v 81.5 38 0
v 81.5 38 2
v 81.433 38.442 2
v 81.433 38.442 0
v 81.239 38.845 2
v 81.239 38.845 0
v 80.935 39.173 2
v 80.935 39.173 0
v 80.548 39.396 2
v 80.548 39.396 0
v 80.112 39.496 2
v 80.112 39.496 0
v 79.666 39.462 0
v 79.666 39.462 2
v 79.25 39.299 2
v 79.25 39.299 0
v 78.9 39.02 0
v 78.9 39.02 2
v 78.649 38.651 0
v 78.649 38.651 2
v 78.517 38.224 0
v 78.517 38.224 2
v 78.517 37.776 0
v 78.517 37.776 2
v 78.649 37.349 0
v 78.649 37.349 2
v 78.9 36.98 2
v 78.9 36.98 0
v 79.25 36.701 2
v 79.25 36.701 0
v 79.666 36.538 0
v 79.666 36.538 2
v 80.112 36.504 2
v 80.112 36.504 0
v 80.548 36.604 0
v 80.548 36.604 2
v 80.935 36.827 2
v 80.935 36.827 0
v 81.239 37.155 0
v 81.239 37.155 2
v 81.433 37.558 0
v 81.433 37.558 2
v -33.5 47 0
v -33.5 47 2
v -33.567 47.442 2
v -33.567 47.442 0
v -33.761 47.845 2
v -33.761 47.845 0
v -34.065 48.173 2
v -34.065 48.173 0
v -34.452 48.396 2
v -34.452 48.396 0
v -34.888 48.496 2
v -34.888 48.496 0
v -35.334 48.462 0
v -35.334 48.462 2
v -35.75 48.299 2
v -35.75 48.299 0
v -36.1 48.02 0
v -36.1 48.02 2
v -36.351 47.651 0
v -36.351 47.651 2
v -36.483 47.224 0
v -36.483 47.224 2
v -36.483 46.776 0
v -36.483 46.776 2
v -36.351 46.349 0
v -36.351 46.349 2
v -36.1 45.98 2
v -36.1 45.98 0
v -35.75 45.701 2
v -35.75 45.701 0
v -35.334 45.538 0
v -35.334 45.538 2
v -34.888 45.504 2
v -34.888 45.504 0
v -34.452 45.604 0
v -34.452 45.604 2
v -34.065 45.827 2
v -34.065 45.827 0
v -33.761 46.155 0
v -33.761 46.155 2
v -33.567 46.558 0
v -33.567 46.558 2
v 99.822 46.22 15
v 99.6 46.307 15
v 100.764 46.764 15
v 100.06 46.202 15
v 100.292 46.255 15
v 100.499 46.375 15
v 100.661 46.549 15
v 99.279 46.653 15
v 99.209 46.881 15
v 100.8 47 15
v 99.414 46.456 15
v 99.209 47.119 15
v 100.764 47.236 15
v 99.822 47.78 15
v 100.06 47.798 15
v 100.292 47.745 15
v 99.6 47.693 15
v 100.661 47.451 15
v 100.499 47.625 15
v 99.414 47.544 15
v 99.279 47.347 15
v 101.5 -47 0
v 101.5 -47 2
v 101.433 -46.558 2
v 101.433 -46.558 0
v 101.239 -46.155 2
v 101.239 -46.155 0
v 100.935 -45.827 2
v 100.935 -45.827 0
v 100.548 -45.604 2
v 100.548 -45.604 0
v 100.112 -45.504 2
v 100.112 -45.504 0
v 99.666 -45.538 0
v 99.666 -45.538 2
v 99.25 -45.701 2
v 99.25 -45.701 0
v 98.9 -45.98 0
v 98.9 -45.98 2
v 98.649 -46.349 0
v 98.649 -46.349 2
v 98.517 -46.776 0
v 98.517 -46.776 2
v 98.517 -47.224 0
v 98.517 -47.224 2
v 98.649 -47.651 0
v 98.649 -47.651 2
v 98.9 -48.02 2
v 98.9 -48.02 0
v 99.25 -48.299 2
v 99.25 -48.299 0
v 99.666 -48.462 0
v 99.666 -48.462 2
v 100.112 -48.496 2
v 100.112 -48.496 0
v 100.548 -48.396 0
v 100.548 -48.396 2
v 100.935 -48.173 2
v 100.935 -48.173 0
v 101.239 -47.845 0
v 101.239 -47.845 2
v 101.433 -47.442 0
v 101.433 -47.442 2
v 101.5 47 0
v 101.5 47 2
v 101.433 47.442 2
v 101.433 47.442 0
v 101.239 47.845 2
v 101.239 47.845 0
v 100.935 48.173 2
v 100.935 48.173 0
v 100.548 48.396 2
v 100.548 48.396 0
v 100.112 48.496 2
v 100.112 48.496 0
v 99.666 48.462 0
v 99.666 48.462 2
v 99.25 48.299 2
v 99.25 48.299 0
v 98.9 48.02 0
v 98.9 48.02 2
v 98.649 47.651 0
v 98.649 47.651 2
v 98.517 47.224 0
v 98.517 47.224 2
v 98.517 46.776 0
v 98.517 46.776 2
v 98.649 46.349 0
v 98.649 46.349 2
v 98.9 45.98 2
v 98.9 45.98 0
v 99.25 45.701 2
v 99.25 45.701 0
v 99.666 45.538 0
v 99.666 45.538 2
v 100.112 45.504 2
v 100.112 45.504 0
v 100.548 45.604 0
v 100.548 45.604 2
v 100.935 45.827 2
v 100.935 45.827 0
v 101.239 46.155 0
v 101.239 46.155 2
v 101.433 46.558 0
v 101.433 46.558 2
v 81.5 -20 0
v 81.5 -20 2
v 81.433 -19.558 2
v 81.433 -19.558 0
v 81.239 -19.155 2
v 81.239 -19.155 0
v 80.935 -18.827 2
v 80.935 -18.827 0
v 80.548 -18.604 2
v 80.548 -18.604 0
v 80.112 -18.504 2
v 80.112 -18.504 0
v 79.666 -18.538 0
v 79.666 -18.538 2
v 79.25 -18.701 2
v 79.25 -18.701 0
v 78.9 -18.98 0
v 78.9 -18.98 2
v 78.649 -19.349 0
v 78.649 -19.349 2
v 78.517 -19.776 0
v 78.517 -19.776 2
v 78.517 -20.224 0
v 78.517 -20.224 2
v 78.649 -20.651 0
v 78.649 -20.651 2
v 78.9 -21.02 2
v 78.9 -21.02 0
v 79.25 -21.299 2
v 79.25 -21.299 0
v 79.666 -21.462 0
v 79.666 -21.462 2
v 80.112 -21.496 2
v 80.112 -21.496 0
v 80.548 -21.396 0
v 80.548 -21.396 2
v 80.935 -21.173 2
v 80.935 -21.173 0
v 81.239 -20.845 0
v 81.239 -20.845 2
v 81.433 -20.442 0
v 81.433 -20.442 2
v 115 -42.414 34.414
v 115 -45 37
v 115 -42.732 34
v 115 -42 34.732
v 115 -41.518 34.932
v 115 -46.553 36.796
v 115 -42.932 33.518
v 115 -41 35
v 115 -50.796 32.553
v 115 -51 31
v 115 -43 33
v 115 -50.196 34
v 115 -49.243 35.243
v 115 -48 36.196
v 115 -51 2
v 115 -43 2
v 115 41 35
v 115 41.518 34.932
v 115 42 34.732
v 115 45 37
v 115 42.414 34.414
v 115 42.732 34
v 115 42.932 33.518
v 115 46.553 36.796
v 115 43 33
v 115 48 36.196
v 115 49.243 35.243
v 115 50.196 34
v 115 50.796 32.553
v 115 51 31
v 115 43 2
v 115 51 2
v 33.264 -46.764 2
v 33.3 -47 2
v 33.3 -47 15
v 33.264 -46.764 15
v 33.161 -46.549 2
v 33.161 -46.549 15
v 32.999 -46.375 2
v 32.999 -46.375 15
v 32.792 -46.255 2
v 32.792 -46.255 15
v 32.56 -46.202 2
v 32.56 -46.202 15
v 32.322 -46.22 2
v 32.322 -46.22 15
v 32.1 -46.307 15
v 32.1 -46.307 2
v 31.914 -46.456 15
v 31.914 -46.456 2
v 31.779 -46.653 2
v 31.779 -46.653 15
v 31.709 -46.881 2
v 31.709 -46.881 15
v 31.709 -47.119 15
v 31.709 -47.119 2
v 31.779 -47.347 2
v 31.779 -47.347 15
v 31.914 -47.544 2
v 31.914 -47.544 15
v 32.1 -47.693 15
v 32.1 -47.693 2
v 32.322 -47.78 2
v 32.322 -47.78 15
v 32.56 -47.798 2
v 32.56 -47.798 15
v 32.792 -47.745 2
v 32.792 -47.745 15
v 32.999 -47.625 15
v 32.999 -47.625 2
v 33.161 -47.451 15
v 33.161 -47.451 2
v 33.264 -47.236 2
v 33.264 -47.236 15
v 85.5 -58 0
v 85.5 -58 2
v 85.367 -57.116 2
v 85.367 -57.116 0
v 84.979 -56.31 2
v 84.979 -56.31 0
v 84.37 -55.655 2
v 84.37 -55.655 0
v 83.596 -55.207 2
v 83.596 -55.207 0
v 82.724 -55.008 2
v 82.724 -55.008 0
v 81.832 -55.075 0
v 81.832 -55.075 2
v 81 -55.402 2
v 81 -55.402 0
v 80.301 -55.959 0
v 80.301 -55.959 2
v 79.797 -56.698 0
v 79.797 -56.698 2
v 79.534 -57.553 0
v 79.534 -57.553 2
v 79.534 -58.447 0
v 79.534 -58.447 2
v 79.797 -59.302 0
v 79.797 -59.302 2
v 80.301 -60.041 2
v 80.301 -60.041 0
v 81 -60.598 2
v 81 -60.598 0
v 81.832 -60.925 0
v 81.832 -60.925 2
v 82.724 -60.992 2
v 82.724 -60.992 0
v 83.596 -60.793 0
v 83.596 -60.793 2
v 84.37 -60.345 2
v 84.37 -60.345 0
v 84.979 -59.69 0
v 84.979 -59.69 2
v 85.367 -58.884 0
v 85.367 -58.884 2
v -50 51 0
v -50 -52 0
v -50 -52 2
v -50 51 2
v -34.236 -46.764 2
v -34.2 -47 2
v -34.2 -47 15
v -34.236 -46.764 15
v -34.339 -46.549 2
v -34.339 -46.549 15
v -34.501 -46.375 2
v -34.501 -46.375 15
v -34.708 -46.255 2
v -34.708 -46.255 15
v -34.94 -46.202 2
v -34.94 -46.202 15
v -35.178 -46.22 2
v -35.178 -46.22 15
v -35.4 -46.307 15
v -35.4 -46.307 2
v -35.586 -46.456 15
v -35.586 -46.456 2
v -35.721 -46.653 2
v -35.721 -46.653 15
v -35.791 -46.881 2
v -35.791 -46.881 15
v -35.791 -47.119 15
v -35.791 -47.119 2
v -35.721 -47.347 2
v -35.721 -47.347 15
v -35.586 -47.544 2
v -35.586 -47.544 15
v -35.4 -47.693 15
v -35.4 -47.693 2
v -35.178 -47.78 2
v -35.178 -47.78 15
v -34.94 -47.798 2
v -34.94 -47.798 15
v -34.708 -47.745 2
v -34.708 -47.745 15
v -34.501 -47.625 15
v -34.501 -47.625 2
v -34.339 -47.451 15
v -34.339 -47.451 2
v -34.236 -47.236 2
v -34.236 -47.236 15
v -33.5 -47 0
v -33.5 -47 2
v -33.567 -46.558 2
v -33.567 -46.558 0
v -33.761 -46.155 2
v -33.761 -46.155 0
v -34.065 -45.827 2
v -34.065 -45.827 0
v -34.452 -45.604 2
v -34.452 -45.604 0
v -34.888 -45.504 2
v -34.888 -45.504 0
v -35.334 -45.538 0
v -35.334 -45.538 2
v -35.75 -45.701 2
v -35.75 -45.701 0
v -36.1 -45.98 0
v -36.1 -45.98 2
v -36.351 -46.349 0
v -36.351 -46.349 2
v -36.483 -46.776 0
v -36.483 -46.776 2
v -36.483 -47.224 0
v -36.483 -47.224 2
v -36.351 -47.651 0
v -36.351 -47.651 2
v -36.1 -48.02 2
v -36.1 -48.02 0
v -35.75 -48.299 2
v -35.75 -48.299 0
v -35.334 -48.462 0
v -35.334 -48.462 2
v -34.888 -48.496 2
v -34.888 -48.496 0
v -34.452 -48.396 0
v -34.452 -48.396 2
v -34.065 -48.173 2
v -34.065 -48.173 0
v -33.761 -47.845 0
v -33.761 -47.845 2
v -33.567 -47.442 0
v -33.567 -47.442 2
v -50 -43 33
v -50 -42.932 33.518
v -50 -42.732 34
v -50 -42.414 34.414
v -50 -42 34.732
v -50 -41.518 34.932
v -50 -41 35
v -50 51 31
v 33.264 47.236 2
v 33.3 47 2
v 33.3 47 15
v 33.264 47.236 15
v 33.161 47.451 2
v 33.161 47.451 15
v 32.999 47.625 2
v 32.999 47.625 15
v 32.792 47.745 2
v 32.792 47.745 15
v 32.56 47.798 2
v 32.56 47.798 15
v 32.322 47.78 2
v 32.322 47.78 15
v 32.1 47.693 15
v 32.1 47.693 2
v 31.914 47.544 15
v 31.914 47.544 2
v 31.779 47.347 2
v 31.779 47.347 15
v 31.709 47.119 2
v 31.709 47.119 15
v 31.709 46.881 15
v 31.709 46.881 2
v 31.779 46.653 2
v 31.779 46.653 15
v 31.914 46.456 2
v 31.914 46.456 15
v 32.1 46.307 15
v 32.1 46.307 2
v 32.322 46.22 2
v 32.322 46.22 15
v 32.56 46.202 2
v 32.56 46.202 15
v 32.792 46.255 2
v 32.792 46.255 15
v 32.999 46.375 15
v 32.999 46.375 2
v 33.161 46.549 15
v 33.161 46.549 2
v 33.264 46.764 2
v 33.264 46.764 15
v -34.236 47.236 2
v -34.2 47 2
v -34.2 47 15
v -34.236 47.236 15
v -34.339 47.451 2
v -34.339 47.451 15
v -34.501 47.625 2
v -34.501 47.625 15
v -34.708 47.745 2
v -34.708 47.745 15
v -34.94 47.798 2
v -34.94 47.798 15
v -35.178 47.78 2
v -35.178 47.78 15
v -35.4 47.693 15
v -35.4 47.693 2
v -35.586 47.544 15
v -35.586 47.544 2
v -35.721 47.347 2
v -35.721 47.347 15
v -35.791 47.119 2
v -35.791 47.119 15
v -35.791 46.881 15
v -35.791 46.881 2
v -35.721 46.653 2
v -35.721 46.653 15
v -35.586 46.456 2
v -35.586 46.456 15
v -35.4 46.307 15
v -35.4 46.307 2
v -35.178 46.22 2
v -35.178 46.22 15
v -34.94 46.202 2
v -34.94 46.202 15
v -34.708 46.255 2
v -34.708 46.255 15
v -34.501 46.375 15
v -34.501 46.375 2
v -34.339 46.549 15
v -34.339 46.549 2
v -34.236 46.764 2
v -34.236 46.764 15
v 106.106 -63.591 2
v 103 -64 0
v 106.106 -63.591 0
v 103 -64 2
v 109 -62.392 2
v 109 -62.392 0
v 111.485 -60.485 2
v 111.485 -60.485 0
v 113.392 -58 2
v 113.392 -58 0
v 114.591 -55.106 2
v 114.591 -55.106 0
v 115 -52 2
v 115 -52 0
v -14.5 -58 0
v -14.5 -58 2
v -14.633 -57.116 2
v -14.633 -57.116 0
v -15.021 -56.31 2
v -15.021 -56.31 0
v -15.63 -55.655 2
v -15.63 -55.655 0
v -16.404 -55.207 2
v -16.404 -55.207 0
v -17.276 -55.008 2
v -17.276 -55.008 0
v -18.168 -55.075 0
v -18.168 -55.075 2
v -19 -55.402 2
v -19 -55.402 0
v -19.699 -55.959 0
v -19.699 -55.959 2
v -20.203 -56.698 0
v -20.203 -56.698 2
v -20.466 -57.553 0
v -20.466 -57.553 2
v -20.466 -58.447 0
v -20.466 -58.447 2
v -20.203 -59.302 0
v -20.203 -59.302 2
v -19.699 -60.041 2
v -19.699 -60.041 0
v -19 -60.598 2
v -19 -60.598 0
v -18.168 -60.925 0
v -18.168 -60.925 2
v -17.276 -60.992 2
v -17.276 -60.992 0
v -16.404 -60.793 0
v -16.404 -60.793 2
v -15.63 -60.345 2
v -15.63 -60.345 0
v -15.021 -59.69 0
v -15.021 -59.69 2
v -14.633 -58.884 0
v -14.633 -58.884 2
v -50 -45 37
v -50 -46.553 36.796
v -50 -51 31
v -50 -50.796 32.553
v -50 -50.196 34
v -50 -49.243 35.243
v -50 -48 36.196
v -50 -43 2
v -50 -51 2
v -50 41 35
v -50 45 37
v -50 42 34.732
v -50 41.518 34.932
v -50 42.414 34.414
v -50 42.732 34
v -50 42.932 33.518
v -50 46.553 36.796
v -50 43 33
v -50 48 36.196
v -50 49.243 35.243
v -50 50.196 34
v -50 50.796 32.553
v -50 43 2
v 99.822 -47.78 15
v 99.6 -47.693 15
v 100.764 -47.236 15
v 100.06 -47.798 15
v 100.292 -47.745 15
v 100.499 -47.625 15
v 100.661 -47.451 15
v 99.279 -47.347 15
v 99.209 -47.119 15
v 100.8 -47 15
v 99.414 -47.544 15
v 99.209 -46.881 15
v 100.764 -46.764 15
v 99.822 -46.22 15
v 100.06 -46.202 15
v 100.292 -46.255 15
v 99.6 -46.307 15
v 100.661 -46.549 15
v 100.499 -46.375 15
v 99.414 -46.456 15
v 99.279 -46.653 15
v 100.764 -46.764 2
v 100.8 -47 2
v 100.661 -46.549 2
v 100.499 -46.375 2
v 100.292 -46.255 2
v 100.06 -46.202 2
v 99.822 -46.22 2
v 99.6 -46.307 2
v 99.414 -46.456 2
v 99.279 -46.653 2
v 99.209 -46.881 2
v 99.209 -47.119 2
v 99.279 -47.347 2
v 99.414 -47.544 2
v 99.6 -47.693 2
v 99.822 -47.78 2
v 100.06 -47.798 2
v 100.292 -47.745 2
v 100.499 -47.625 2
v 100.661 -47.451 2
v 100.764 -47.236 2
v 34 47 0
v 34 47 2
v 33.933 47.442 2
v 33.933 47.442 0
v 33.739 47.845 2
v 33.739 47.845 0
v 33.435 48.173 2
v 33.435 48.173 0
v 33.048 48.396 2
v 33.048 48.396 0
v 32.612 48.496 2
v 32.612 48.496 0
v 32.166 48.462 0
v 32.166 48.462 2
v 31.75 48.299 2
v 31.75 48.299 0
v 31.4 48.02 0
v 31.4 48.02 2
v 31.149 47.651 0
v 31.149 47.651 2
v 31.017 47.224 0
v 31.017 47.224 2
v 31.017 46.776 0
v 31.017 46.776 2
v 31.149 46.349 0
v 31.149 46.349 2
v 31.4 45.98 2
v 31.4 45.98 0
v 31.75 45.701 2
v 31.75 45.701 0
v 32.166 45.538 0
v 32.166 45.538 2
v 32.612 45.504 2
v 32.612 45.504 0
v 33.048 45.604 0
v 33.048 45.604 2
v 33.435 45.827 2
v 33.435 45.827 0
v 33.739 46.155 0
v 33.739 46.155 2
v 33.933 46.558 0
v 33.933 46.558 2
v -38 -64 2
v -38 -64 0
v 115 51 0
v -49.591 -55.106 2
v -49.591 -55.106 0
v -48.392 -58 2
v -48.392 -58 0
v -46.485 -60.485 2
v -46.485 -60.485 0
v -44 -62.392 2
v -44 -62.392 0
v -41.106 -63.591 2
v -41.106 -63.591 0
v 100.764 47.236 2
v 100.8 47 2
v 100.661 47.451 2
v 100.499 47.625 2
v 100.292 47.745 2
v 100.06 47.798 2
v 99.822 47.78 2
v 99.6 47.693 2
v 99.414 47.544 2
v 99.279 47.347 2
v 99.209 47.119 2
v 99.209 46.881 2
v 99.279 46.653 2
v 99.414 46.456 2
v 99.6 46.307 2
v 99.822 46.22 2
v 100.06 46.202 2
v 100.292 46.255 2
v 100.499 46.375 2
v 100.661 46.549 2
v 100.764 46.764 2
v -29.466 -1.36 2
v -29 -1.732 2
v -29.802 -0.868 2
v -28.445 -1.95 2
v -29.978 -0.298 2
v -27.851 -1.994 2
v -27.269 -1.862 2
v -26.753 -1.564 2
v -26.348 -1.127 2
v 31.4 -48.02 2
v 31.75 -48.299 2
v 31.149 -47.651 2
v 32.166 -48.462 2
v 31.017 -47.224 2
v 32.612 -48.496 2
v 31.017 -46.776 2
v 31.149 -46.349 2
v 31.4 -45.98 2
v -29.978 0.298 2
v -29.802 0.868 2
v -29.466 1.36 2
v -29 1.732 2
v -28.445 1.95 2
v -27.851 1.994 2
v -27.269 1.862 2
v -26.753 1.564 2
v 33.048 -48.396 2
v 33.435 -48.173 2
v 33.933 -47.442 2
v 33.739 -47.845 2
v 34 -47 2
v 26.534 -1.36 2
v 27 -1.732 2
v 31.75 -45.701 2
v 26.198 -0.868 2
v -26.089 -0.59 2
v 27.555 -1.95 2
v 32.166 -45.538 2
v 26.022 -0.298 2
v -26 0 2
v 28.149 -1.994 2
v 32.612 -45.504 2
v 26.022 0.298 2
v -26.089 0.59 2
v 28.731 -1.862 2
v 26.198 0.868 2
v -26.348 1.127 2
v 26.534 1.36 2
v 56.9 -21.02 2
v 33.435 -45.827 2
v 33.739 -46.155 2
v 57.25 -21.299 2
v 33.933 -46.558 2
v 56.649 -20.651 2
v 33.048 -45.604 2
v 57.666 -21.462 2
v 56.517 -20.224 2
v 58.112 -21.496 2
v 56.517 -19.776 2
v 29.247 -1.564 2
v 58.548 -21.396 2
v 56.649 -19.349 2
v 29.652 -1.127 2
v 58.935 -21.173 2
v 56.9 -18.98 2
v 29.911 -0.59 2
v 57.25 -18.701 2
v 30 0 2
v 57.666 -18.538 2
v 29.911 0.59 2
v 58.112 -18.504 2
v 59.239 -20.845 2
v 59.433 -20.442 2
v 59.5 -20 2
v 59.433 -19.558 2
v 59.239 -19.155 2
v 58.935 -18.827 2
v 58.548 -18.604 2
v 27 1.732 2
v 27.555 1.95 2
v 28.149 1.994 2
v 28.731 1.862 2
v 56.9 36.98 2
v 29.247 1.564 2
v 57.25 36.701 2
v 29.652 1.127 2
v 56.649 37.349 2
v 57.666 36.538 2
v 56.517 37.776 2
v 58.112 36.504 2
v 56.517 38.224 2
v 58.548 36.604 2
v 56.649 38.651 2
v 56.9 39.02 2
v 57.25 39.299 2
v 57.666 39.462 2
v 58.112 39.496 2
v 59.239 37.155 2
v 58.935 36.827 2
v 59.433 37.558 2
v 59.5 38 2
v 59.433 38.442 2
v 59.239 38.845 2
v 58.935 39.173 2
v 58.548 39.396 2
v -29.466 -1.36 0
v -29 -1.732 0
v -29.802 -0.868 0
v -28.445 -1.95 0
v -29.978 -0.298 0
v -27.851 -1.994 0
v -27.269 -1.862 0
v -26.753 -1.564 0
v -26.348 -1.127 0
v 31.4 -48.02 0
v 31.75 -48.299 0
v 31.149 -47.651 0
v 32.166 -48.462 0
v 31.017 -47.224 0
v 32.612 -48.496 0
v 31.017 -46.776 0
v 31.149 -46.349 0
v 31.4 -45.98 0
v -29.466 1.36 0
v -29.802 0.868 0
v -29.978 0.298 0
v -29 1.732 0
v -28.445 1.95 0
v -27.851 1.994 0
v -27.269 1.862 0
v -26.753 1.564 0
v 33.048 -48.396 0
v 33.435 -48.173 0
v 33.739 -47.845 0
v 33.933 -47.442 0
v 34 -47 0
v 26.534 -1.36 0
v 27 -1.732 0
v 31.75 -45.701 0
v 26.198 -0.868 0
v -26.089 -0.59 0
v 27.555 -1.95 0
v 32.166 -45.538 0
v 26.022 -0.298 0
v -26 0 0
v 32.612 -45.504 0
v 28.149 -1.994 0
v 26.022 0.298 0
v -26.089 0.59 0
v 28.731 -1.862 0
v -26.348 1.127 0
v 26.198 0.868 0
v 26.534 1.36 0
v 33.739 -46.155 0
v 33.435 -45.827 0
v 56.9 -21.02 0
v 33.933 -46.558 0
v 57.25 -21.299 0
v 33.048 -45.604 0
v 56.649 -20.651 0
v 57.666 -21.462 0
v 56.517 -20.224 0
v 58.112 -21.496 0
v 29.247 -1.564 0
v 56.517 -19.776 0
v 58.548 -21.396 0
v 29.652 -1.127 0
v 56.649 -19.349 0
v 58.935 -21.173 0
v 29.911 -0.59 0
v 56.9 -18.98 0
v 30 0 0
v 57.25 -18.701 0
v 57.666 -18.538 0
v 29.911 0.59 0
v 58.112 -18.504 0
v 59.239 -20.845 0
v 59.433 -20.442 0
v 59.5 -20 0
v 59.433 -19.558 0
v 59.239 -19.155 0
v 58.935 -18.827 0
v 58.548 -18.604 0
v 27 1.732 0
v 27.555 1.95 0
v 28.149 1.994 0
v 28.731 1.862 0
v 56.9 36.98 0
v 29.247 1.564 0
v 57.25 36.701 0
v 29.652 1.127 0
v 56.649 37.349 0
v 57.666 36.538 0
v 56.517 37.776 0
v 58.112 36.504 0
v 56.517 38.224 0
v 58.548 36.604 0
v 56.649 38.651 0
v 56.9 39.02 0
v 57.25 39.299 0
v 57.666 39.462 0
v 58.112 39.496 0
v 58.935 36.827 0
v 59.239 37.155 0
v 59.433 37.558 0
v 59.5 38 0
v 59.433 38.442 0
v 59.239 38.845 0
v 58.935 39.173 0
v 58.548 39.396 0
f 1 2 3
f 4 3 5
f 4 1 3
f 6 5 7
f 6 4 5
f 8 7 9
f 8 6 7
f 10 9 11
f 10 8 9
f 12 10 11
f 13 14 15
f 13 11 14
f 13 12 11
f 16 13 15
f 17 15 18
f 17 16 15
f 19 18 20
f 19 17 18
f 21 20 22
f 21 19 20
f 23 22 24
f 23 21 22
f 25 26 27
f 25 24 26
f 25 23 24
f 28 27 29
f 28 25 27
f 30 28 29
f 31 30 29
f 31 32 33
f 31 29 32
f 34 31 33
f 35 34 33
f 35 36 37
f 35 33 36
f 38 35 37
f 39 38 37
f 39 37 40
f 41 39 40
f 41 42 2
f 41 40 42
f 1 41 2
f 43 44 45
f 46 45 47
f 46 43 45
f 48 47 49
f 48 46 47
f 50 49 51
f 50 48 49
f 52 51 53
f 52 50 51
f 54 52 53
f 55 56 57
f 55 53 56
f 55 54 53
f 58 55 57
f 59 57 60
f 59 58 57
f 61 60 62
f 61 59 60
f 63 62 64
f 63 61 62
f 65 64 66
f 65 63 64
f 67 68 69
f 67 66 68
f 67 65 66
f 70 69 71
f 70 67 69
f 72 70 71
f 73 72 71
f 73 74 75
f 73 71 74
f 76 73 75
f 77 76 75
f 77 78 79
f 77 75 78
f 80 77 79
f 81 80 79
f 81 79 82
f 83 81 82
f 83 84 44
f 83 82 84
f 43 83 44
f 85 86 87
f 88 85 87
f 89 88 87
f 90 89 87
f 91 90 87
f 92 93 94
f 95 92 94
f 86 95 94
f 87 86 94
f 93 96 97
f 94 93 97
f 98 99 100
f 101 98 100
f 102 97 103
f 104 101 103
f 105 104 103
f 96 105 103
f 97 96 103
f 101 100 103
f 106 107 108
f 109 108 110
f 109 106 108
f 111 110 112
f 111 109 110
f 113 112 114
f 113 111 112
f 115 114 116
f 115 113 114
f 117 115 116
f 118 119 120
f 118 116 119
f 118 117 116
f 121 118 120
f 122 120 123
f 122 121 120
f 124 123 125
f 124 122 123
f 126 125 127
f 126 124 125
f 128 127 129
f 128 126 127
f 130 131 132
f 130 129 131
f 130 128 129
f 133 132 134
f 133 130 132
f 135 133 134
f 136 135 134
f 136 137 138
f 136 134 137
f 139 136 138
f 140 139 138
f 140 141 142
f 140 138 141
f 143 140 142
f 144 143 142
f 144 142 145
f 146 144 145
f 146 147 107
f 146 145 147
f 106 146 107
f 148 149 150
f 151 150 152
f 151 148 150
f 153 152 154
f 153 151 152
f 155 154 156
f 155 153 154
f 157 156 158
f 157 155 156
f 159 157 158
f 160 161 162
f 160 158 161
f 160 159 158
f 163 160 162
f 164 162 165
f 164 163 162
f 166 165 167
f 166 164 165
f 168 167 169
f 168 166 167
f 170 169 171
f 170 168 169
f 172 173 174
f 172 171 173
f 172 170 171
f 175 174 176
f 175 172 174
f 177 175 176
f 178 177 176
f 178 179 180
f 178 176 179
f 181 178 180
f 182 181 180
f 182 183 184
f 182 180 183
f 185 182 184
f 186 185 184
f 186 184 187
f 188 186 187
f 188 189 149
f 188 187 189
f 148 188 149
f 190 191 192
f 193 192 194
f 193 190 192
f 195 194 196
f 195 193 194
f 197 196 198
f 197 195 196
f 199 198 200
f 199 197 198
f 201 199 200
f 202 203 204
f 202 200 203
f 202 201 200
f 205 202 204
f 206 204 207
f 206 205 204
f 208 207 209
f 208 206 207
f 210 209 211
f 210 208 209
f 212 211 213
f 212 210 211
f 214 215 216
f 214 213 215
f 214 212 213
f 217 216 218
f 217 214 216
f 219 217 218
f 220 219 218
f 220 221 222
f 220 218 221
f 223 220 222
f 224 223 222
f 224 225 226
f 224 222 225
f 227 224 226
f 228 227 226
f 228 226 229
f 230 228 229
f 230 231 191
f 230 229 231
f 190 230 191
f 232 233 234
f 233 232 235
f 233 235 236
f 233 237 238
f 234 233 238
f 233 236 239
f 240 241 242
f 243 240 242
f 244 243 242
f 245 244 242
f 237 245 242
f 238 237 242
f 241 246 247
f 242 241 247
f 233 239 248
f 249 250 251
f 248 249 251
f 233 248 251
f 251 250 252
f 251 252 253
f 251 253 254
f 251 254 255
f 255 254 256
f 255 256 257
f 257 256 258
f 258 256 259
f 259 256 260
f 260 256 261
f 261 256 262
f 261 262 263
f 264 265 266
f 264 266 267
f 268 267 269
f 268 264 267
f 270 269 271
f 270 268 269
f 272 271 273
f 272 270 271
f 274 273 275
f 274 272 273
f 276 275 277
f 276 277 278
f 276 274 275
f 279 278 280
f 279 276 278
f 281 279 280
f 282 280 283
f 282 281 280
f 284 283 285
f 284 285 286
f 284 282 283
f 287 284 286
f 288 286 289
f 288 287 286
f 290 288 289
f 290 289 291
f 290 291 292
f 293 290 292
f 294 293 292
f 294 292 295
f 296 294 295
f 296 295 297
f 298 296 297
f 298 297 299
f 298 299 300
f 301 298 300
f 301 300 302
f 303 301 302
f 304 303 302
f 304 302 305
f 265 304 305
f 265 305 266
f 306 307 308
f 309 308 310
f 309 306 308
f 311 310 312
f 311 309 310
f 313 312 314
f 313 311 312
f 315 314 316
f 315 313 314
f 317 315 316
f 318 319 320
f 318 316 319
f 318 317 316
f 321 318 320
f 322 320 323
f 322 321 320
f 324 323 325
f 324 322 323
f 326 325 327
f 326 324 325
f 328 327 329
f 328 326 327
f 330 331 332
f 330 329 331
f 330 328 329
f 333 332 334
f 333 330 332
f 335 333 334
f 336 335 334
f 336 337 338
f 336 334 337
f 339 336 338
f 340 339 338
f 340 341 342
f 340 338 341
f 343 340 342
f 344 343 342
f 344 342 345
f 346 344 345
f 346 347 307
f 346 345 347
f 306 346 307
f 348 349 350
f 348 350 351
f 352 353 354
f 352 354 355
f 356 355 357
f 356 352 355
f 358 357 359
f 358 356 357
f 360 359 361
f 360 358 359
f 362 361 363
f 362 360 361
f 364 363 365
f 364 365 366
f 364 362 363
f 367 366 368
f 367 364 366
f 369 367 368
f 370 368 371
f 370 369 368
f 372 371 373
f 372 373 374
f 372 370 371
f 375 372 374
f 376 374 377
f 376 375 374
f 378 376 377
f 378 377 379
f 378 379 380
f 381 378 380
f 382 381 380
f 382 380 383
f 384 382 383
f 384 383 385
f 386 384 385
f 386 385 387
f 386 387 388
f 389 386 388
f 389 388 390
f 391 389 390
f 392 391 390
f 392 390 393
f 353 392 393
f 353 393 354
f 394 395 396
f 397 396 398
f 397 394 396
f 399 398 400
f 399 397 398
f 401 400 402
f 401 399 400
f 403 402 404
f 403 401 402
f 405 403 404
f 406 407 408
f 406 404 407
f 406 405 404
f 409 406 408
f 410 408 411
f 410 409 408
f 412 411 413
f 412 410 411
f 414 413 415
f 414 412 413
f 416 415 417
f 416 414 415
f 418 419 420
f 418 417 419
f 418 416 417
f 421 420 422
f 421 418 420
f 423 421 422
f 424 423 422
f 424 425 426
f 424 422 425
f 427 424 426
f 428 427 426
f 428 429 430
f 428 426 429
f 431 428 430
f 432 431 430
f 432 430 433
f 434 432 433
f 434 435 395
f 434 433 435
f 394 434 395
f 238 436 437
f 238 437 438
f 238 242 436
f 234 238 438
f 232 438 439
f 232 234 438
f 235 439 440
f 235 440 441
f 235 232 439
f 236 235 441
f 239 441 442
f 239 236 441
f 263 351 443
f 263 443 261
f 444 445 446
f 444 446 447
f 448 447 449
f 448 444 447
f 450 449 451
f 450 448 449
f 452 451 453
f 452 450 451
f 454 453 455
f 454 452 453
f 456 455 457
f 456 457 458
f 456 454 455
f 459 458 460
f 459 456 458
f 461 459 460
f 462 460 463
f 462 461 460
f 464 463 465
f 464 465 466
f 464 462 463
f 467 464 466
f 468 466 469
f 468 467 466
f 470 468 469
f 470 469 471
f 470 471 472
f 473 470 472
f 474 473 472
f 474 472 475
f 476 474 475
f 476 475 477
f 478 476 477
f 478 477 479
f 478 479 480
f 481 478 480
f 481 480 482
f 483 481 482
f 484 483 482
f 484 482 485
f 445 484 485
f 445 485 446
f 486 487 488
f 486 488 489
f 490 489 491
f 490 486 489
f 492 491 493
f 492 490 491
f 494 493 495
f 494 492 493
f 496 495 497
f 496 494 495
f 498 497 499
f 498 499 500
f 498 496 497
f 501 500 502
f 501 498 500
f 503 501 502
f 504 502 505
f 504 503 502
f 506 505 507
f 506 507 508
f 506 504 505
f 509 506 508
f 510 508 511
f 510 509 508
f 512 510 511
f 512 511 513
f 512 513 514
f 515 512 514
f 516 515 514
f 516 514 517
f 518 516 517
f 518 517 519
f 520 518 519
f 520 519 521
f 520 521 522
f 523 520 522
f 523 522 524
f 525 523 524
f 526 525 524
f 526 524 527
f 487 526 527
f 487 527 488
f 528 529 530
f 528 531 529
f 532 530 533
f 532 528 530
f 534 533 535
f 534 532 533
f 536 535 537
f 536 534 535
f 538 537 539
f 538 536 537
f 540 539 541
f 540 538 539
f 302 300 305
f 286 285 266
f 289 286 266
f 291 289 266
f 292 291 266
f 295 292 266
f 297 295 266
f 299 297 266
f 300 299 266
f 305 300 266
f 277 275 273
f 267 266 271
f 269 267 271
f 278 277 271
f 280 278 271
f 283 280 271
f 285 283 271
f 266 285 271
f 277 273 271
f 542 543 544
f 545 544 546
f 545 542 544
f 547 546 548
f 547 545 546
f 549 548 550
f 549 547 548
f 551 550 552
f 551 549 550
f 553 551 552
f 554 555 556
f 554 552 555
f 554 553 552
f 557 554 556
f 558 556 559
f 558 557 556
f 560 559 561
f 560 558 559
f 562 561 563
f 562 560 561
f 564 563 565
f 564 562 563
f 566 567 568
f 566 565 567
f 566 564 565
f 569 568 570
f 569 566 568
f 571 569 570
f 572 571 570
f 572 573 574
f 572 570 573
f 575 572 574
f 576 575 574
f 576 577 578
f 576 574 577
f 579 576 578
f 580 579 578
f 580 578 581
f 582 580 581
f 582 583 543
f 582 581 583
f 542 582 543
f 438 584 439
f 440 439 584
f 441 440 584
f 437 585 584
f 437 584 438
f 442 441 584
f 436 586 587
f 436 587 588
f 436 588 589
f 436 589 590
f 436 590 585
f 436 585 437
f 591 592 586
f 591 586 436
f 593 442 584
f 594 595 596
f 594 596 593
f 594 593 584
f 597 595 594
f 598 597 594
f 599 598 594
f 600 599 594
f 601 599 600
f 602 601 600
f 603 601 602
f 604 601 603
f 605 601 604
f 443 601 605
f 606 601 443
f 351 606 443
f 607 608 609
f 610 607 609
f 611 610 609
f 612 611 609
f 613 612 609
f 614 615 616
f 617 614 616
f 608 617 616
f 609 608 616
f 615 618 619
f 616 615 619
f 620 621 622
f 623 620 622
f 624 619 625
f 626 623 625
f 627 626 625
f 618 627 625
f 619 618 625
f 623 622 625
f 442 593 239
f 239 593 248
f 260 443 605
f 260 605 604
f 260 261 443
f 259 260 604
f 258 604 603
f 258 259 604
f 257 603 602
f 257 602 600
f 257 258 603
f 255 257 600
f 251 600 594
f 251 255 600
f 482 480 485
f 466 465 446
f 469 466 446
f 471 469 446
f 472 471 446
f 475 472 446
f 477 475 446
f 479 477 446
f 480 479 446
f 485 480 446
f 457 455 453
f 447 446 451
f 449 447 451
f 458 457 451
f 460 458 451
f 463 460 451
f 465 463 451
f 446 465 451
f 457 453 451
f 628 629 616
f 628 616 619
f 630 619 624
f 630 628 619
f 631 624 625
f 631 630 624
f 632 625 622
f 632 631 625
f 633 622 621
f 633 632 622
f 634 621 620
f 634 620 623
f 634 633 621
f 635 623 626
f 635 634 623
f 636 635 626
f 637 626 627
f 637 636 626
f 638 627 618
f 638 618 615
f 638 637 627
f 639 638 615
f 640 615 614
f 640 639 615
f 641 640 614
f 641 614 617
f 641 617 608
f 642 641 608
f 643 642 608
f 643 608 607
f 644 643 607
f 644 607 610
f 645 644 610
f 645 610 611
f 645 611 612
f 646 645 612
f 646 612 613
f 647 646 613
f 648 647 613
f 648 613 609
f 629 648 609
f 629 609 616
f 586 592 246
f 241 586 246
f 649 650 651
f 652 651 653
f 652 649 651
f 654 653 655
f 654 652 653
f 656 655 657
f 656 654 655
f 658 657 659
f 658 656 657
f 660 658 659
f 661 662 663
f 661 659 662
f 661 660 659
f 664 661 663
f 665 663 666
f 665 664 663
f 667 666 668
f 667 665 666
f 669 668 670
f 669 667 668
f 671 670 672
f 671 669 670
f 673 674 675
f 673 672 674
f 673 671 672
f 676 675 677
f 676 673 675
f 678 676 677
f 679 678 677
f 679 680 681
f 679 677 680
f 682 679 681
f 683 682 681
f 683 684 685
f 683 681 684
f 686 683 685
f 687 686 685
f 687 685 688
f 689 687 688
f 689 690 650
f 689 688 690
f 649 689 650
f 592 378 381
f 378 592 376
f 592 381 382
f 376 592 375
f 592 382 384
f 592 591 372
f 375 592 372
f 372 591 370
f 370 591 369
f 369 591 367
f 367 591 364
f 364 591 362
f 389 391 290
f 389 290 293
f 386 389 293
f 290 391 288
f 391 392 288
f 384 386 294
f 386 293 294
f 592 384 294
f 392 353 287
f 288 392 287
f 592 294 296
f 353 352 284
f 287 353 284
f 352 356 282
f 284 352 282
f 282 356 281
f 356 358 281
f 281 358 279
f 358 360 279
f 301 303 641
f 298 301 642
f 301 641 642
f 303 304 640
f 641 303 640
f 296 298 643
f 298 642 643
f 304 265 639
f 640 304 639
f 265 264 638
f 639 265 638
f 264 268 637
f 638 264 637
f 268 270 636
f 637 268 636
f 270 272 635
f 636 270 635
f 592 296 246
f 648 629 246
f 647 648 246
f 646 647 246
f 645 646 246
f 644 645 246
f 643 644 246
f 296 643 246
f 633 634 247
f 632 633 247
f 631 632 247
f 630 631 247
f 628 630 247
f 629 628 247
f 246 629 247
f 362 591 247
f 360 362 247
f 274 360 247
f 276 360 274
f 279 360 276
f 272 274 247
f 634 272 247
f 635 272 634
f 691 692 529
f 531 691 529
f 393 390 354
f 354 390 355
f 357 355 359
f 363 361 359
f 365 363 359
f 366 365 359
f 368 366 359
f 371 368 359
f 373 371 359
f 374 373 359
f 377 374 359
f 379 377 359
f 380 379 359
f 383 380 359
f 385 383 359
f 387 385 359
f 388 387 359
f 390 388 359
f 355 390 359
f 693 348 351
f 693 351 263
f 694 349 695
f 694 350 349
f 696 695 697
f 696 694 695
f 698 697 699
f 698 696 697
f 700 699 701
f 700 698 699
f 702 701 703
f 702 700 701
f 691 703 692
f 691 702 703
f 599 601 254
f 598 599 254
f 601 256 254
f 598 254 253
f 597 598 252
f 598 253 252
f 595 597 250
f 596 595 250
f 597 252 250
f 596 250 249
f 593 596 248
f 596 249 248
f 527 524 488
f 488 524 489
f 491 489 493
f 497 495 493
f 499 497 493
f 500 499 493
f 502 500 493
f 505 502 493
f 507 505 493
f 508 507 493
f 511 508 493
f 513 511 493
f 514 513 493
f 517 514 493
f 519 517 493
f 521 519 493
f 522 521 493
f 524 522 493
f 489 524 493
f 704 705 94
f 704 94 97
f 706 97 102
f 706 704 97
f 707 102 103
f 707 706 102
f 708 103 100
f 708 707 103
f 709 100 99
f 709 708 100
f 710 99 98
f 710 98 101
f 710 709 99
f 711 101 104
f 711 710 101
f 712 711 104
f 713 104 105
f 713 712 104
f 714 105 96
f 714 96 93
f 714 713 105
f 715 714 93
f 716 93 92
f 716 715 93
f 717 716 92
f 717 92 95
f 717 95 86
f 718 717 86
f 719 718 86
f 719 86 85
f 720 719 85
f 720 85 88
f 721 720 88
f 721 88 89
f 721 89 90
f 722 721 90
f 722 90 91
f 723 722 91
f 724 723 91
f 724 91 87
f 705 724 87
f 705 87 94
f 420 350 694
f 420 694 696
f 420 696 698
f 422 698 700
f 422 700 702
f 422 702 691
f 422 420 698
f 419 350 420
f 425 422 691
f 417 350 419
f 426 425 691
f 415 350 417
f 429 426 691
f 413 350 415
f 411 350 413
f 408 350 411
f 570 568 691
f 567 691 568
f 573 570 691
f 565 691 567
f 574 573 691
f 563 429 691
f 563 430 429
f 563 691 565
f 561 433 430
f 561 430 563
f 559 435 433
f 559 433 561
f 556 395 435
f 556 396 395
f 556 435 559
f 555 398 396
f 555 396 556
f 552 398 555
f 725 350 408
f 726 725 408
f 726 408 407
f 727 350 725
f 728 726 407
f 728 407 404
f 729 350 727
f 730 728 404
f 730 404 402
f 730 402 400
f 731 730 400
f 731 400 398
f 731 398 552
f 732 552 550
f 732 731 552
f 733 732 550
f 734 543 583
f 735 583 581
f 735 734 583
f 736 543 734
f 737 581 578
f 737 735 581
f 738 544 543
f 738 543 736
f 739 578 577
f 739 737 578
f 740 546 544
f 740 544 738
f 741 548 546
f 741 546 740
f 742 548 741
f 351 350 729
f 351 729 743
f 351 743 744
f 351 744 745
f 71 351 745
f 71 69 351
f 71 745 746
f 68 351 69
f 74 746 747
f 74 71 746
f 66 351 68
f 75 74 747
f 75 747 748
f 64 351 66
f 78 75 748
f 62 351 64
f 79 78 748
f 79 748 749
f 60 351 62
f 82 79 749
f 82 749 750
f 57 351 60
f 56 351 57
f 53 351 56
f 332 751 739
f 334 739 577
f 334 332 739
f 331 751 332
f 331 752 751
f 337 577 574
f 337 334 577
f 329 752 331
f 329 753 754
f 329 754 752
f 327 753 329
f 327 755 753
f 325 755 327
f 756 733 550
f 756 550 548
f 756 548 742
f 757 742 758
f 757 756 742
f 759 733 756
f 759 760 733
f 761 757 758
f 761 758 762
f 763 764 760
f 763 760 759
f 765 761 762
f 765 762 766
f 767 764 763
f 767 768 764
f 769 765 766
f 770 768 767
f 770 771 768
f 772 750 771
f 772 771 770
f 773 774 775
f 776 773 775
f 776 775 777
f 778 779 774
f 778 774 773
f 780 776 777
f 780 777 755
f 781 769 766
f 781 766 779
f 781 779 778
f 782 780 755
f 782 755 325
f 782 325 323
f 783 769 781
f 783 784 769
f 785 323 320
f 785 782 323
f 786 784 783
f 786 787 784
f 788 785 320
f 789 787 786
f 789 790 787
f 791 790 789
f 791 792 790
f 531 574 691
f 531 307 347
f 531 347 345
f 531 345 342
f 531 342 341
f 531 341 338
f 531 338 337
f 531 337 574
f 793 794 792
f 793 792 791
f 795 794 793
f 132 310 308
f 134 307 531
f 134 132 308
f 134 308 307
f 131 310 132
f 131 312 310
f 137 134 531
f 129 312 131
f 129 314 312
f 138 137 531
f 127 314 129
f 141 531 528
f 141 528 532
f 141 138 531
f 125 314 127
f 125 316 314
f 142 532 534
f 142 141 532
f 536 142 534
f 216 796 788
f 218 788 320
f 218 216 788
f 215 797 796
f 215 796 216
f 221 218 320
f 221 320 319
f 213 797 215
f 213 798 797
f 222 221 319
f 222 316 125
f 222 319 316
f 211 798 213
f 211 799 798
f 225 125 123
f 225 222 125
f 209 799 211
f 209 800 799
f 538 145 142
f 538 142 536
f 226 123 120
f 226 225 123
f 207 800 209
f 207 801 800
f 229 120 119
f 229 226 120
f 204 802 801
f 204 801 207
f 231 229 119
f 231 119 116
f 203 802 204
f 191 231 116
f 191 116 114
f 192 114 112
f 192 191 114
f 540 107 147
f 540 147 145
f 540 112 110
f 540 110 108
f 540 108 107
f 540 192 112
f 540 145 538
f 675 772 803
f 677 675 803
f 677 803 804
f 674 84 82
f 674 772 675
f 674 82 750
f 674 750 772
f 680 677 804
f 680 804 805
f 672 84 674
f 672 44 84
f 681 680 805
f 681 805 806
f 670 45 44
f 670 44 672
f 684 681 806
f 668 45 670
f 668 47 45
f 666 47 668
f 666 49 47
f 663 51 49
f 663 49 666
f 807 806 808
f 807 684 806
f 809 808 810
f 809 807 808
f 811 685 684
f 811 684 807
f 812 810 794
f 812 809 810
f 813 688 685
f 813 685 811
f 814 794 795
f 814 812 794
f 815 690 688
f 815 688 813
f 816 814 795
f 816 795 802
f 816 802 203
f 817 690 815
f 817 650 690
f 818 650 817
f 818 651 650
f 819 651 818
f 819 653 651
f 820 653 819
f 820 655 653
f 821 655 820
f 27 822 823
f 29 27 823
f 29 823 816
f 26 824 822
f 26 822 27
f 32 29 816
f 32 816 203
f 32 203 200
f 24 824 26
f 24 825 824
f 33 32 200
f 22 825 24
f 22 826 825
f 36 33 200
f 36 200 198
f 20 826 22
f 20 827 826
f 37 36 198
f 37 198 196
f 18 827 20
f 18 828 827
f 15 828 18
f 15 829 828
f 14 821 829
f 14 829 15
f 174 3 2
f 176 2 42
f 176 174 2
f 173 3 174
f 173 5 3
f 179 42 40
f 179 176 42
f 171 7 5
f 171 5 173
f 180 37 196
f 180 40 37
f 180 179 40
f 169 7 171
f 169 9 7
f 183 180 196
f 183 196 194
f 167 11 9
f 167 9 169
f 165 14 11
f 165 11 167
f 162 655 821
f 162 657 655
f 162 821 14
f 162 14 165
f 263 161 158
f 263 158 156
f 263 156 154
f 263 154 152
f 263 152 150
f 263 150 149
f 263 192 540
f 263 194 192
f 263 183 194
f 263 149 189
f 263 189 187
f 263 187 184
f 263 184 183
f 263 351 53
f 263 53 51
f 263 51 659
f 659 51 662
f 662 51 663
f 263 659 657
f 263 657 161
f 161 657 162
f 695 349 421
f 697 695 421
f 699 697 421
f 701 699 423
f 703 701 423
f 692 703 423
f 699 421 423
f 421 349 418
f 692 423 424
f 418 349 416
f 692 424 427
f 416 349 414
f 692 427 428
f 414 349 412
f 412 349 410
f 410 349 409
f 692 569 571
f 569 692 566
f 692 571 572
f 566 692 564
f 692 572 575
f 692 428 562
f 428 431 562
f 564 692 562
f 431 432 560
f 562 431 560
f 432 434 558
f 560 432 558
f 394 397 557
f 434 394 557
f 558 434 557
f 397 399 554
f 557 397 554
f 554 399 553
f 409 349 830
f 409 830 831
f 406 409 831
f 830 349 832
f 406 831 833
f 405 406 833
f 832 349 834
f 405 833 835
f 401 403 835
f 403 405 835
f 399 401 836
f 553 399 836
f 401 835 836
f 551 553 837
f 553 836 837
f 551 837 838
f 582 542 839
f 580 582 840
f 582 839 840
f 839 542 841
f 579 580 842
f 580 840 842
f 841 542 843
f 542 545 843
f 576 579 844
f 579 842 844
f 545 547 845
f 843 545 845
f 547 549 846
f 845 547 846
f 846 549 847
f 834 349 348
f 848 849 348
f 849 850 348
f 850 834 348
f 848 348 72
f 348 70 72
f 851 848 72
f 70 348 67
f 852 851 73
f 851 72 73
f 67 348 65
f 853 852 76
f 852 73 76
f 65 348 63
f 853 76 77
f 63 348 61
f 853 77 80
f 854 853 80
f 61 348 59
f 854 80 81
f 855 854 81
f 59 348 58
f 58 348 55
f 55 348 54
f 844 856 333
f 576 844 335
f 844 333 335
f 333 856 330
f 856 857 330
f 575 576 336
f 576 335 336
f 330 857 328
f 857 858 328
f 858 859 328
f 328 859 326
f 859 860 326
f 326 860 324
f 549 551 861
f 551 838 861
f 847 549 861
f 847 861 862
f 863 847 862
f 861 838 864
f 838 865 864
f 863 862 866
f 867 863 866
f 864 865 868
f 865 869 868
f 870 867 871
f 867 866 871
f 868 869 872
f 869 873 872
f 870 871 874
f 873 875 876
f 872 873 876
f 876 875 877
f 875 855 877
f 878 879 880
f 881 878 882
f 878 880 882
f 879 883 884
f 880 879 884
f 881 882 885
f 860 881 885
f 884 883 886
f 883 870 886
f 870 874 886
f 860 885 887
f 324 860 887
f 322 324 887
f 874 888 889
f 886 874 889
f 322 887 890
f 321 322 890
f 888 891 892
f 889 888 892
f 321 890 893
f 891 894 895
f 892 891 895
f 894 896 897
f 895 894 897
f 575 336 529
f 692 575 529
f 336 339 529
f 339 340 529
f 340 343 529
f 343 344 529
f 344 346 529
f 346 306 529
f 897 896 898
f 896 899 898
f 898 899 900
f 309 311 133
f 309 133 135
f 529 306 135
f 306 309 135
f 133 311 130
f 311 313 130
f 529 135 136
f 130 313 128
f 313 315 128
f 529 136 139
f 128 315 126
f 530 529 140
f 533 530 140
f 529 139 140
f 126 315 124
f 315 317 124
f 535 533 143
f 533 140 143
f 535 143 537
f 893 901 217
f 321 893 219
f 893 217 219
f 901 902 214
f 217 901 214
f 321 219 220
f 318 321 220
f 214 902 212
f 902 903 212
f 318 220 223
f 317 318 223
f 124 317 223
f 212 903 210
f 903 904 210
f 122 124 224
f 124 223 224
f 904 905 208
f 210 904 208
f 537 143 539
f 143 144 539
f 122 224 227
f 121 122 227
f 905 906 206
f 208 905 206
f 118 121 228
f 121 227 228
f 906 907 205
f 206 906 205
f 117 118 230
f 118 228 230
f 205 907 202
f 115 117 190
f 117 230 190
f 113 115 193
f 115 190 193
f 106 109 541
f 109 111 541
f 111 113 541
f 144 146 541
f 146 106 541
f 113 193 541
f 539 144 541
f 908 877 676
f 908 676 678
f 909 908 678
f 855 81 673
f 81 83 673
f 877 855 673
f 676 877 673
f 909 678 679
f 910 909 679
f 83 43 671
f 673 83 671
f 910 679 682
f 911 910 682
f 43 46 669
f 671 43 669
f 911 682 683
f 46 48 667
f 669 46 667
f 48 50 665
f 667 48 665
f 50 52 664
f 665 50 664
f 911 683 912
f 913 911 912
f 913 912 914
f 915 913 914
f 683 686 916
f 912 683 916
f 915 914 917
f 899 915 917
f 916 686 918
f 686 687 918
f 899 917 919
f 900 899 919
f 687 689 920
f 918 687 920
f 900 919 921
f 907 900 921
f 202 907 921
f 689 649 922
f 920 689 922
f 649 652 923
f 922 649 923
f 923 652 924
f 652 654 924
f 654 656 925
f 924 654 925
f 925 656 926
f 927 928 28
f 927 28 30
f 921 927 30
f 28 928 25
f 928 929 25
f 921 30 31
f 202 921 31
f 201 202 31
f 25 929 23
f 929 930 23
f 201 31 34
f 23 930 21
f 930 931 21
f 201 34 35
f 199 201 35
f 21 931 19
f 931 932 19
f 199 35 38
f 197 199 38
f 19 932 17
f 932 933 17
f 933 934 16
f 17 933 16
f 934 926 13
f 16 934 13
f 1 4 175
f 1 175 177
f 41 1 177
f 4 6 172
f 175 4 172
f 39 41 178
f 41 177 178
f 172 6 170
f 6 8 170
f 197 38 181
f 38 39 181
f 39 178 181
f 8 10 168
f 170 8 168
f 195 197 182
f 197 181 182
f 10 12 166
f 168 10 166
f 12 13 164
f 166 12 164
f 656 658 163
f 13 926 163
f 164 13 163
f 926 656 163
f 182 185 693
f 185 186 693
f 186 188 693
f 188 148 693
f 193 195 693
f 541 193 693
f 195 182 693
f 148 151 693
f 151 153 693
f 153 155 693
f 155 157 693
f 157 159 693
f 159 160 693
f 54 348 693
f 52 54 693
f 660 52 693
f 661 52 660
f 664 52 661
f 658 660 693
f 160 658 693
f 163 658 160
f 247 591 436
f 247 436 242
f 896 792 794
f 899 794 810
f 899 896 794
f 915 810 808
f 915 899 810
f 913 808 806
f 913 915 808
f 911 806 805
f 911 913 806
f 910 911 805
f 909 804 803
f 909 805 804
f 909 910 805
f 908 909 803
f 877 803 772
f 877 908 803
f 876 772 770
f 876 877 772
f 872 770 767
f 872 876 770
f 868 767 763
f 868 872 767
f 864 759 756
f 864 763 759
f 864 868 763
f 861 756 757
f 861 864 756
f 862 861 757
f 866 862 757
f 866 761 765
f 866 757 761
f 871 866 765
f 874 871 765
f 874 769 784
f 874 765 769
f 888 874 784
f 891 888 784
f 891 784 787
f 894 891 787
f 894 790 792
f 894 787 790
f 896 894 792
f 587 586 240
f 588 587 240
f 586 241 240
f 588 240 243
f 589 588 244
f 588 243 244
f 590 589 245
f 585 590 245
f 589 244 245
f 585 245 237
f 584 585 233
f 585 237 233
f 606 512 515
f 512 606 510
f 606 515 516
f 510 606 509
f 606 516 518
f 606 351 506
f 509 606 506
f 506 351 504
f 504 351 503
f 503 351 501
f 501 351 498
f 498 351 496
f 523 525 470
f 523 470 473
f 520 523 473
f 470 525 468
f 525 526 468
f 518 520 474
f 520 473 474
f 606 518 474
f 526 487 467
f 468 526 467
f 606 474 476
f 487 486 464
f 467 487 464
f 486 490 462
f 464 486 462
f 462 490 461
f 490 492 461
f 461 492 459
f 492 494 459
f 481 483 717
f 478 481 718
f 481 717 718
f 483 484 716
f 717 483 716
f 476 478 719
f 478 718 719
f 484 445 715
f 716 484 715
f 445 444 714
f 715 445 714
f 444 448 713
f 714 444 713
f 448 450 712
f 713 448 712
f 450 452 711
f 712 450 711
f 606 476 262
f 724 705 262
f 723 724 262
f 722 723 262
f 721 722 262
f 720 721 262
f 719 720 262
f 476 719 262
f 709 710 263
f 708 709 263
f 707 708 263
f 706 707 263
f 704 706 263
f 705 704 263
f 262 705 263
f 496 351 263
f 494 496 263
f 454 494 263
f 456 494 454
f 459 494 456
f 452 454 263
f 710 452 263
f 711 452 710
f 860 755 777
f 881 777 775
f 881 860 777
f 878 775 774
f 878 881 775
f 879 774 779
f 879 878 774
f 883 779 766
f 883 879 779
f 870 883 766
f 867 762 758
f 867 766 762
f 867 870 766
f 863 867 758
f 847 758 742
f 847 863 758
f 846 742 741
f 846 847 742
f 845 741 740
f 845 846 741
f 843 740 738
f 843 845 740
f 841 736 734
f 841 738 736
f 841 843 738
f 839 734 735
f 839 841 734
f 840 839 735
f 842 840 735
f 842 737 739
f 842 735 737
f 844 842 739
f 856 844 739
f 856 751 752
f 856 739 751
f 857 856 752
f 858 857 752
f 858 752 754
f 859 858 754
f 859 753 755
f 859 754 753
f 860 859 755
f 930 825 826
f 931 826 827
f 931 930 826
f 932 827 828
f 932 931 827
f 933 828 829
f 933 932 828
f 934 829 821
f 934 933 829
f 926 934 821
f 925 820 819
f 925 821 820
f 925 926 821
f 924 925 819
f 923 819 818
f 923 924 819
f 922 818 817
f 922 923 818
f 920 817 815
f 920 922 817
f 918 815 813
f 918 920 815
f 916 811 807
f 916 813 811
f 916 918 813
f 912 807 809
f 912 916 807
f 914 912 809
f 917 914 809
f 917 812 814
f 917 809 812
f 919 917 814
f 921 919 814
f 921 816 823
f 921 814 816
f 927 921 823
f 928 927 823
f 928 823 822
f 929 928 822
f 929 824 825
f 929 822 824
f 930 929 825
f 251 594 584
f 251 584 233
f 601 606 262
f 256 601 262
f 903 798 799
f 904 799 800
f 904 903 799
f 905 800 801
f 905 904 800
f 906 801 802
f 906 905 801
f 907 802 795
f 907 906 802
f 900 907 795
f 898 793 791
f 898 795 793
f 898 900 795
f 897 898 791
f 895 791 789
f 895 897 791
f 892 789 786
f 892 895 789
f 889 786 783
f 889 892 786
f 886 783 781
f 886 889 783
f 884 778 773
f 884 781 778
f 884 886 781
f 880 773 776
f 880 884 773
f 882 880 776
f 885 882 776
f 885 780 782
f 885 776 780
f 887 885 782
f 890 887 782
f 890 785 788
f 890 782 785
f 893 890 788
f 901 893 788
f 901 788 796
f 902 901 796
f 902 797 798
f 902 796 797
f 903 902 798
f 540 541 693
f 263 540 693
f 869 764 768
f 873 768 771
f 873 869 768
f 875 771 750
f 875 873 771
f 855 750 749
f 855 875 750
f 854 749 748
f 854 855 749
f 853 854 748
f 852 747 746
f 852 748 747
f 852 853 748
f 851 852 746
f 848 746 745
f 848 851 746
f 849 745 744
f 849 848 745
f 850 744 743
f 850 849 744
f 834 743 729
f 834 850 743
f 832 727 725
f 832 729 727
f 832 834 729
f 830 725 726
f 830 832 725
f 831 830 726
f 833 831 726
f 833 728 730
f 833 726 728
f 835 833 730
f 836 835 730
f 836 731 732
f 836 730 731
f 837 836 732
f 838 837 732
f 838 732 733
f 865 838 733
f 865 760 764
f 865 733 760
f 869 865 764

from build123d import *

# Parameters (mm, degrees)
CYLINDER014_R     = 0.8
CYLINDER014_DEPTH = 15
CYLINDER015_R     = 0.8
CYLINDER015_DEPTH = 15
CYLINDER016_R     = 0.8
CYLINDER016_DEPTH = 15
CYLINDER017_R     = 0.8
CYLINDER017_DEPTH = 15
CYLINDER018_R     = 0.8
CYLINDER018_DEPTH = 15
CYLINDER019_R     = 0.8
CYLINDER019_DEPTH = 15
BOX001_W          = 165
BOX001_H          = 86
BOX001_DEPTH      = 35
FILLET_R          = 2
BOX002_W          = 165
BOX002_H          = 102
BOX002_DEPTH      = 35
FILLET001_R       = 6
CYLINDER001_R     = 2
CYLINDER001_DEPTH = 10
CYLINDER002_R     = 1.5
CYLINDER002_DEPTH = 10
CYLINDER003_R     = 1.5
CYLINDER003_DEPTH = 10
CYLINDER004_R     = 1.5
CYLINDER004_DEPTH = 10
CYLINDER005_R     = 1.5
CYLINDER005_DEPTH = 10
CYLINDER006_R     = 3
CYLINDER006_DEPTH = 10
CYLINDER007_R     = 3
CYLINDER007_DEPTH = 10
CYLINDER008_R     = 1.5
CYLINDER008_DEPTH = 10
CYLINDER009_R     = 1.5
CYLINDER009_DEPTH = 10
CYLINDER010_R     = 1.5
CYLINDER010_DEPTH = 10
CYLINDER011_R     = 1.5
CYLINDER011_DEPTH = 10
CYLINDER012_R     = 1.5
CYLINDER012_DEPTH = 10
CYLINDER013_R     = 1.5
CYLINDER013_DEPTH = 10
CYLINDER_R        = 2
CYLINDER_DEPTH    = 10
BOX_W             = 165
BOX_H             = 115
BOX_DEPTH         = 2
FILLET002_R       = 12


with BuildPart() as boxscrew007:
    # Cylinder014 → Cylinder014 (new body)
    with BuildSketch(Plane(origin=(100, 47, 0), x_dir=(1, 0, 0), z_dir=(0, 0, 1))):
        Circle(CYLINDER014_R)
    extrude(amount=CYLINDER014_DEPTH)


with BuildPart() as boxscrew008:
    # Cylinder015 → Cylinder015 (new body)
    with BuildSketch(Plane(origin=(-35, 47, 0), x_dir=(1, 0, 0), z_dir=(0, 0, 1))):
        Circle(CYLINDER015_R)
    extrude(amount=CYLINDER015_DEPTH)


with BuildPart() as boxscrew009:
    # Cylinder016 → Cylinder016 (new body)
    with BuildSketch(Plane(origin=(32.5, 47, 0), x_dir=(1, 0, 0), z_dir=(0, 0, 1))):
        Circle(CYLINDER016_R)
    extrude(amount=CYLINDER016_DEPTH)


with BuildPart() as boxscrew010:
    # Cylinder017 → Cylinder017 (new body)
    with BuildSketch(Plane(origin=(100, -47, 0), x_dir=(1, 0, 0), z_dir=(0, 0, 1))):
        Circle(CYLINDER017_R)
    extrude(amount=CYLINDER017_DEPTH)


with BuildPart() as boxscrew011:
    # Cylinder018 → Cylinder018 (new body)
    with BuildSketch(Plane(origin=(-35, -47, 0), x_dir=(1, 0, 0), z_dir=(0, 0, 1))):
        Circle(CYLINDER018_R)
    extrude(amount=CYLINDER018_DEPTH)


with BuildPart() as fusion001:
    # Cylinder019 → Cylinder019 (new body)
    with BuildSketch(Plane(origin=(32.5, -47, 0), x_dir=(1, 0, 0), z_dir=(0, 0, 1))):
        Circle(CYLINDER019_R)
    extrude(amount=CYLINDER019_DEPTH)

    # Fusion001: union BoxScrew007, BoxScrew008, BoxScrew009, BoxScrew010, BoxScrew011
    add(boxscrew007.part)
    add(boxscrew008.part)
    add(boxscrew009.part)
    add(boxscrew010.part)
    add(boxscrew011.part)


with BuildPart() as fillet_body:
    # Box001 → Box001 (new body)
    with BuildSketch(Plane(origin=(-50, -43, 0), x_dir=(1, 0, 0), z_dir=(0, 0, 1))):
        with Locations((82.5, 43)):
            Rectangle(BOX001_W, BOX001_H)
    extrude(amount=BOX001_DEPTH)

    # Fillet
    fillet_edges = [fillet_body.edges().sort_by_distance(p)[0] for p in [
        (32.5, -43, 35),
        (32.5, 43, 35),
    ]]
    fillet(fillet_edges, radius=FILLET_R)


with BuildPart() as cover:
    # Box002 → Box002 (new body)
    with BuildSketch(Plane(origin=(-50, -51, 2), x_dir=(1, 0, 0), z_dir=(0, 0, 1))):
        with Locations((82.5, 51)):
            Rectangle(BOX002_W, BOX002_H)
    extrude(amount=BOX002_DEPTH)

    # Fillet001
    fillet001_edges = [cover.edges().sort_by_distance(p)[0] for p in [
        (32.5, -51, 37),
        (32.5, 51, 37),
    ]]
    fillet(fillet001_edges, radius=FILLET001_R)

    # Cut: cut Fillet body
    add(fillet_body.part, mode=Mode.SUBTRACT)

    # Cut002: cut Fusion001
    add(fusion001.part, mode=Mode.SUBTRACT)


with BuildPart() as pwrscrew002:
    # Cylinder001 → Cylinder001 (new body)
    with BuildSketch(Plane(origin=(-28, 0, 0), x_dir=(1, 0, 0), z_dir=(0, 0, 1))):
        Circle(CYLINDER001_R)
    extrude(amount=CYLINDER001_DEPTH)


with BuildPart() as computerscrew001:
    # Cylinder002 → Cylinder002 (new body)
    with BuildSketch(Plane(origin=(58, 38, 0), x_dir=(1, 0, 0), z_dir=(0, 0, 1))):
        Circle(CYLINDER002_R)
    extrude(amount=CYLINDER002_DEPTH)


with BuildPart() as computerscrew002:
    # Cylinder003 → Cylinder003 (new body)
    with BuildSketch(Plane(origin=(58, -20, 0), x_dir=(1, 0, 0), z_dir=(0, 0, 1))):
        Circle(CYLINDER003_R)
    extrude(amount=CYLINDER003_DEPTH)


with BuildPart() as computerscrew003:
    # Cylinder004 → Cylinder004 (new body)
    with BuildSketch(Plane(origin=(80, 38, 0), x_dir=(1, 0, 0), z_dir=(0, 0, 1))):
        Circle(CYLINDER004_R)
    extrude(amount=CYLINDER004_DEPTH)


with BuildPart() as computerscrew004:
    # Cylinder005 → Cylinder005 (new body)
    with BuildSketch(Plane(origin=(80, -20, 0), x_dir=(1, 0, 0), z_dir=(0, 0, 1))):
        Circle(CYLINDER005_R)
    extrude(amount=CYLINDER005_DEPTH)


with BuildPart() as mainscrew001:
    # Cylinder006 → Cylinder006 (new body)
    with BuildSketch(Plane(origin=(-17.5, -58, 0), x_dir=(1, 0, 0), z_dir=(0, 0, 1))):
        Circle(CYLINDER006_R)
    extrude(amount=CYLINDER006_DEPTH)


with BuildPart() as mainscrew002:
    # Cylinder007 → Cylinder007 (new body)
    with BuildSketch(Plane(origin=(82.5, -58, 0), x_dir=(1, 0, 0), z_dir=(0, 0, 1))):
        Circle(CYLINDER007_R)
    extrude(amount=CYLINDER007_DEPTH)


with BuildPart() as boxscrew001:
    # Cylinder008 → Cylinder008 (new body)
    with BuildSketch(Plane(origin=(100, 47, 0), x_dir=(1, 0, 0), z_dir=(0, 0, 1))):
        Circle(CYLINDER008_R)
    extrude(amount=CYLINDER008_DEPTH)


with BuildPart() as boxscrew002:
    # Cylinder009 → Cylinder009 (new body)
    with BuildSketch(Plane(origin=(-35, 47, 0), x_dir=(1, 0, 0), z_dir=(0, 0, 1))):
        Circle(CYLINDER009_R)
    extrude(amount=CYLINDER009_DEPTH)


with BuildPart() as boxscrew003:
    # Cylinder010 → Cylinder010 (new body)
    with BuildSketch(Plane(origin=(32.5, 47, 0), x_dir=(1, 0, 0), z_dir=(0, 0, 1))):
        Circle(CYLINDER010_R)
    extrude(amount=CYLINDER010_DEPTH)


with BuildPart() as boxscrew004:
    # Cylinder011 → Cylinder011 (new body)
    with BuildSketch(Plane(origin=(100, -47, 0), x_dir=(1, 0, 0), z_dir=(0, 0, 1))):
        Circle(CYLINDER011_R)
    extrude(amount=CYLINDER011_DEPTH)


with BuildPart() as boxscrew005:
    # Cylinder012 → Cylinder012 (new body)
    with BuildSketch(Plane(origin=(-35, -47, 0), x_dir=(1, 0, 0), z_dir=(0, 0, 1))):
        Circle(CYLINDER012_R)
    extrude(amount=CYLINDER012_DEPTH)


with BuildPart() as boxscrew006:
    # Cylinder013 → Cylinder013 (new body)
    with BuildSketch(Plane(origin=(32.5, -47, 0), x_dir=(1, 0, 0), z_dir=(0, 0, 1))):
        Circle(CYLINDER013_R)
    extrude(amount=CYLINDER013_DEPTH)


with BuildPart() as screwholles:
    # Cylinder → Cylinder (new body)
    with BuildSketch(Plane(origin=(28, 0, 0), x_dir=(1, 0, 0), z_dir=(0, 0, 1))):
        Circle(CYLINDER_R)
    extrude(amount=CYLINDER_DEPTH)

    # Fusion: union PwrScrew002, ComputerScrew001, ComputerScrew002, ComputerScrew003, ComputerScrew004, MainScrew001, MainScrew002, BoxScrew001, BoxScrew002, BoxScrew003, BoxScrew004, BoxScrew005, BoxScrew006
    add(pwrscrew002.part)
    add(computerscrew001.part)
    add(computerscrew002.part)
    add(computerscrew003.part)
    add(computerscrew004.part)
    add(mainscrew001.part)
    add(mainscrew002.part)
    add(boxscrew001.part)
    add(boxscrew002.part)
    add(boxscrew003.part)
    add(boxscrew004.part)
    add(boxscrew005.part)
    add(boxscrew006.part)


with BuildPart() as base001:
    # Box → Box (new body)
    with BuildSketch(Plane(origin=(-50, -64, 0), x_dir=(1, 0, 0), z_dir=(0, 0, 1))):
        with Locations((82.5, 57.5)):
            Rectangle(BOX_W, BOX_H)
    extrude(amount=BOX_DEPTH)

    # Cut001: cut ScrewHolles
    add(screwholles.part, mode=Mode.SUBTRACT)

    # Fillet002
    fillet002_edges = [base001.edges().sort_by_distance(p)[0] for p in [
        (-50, -64, 1),
        (115, -64, 1),
    ]]
    fillet(fillet002_edges, radius=FILLET002_R)


solid = Compound([cover.part, base001.part])
